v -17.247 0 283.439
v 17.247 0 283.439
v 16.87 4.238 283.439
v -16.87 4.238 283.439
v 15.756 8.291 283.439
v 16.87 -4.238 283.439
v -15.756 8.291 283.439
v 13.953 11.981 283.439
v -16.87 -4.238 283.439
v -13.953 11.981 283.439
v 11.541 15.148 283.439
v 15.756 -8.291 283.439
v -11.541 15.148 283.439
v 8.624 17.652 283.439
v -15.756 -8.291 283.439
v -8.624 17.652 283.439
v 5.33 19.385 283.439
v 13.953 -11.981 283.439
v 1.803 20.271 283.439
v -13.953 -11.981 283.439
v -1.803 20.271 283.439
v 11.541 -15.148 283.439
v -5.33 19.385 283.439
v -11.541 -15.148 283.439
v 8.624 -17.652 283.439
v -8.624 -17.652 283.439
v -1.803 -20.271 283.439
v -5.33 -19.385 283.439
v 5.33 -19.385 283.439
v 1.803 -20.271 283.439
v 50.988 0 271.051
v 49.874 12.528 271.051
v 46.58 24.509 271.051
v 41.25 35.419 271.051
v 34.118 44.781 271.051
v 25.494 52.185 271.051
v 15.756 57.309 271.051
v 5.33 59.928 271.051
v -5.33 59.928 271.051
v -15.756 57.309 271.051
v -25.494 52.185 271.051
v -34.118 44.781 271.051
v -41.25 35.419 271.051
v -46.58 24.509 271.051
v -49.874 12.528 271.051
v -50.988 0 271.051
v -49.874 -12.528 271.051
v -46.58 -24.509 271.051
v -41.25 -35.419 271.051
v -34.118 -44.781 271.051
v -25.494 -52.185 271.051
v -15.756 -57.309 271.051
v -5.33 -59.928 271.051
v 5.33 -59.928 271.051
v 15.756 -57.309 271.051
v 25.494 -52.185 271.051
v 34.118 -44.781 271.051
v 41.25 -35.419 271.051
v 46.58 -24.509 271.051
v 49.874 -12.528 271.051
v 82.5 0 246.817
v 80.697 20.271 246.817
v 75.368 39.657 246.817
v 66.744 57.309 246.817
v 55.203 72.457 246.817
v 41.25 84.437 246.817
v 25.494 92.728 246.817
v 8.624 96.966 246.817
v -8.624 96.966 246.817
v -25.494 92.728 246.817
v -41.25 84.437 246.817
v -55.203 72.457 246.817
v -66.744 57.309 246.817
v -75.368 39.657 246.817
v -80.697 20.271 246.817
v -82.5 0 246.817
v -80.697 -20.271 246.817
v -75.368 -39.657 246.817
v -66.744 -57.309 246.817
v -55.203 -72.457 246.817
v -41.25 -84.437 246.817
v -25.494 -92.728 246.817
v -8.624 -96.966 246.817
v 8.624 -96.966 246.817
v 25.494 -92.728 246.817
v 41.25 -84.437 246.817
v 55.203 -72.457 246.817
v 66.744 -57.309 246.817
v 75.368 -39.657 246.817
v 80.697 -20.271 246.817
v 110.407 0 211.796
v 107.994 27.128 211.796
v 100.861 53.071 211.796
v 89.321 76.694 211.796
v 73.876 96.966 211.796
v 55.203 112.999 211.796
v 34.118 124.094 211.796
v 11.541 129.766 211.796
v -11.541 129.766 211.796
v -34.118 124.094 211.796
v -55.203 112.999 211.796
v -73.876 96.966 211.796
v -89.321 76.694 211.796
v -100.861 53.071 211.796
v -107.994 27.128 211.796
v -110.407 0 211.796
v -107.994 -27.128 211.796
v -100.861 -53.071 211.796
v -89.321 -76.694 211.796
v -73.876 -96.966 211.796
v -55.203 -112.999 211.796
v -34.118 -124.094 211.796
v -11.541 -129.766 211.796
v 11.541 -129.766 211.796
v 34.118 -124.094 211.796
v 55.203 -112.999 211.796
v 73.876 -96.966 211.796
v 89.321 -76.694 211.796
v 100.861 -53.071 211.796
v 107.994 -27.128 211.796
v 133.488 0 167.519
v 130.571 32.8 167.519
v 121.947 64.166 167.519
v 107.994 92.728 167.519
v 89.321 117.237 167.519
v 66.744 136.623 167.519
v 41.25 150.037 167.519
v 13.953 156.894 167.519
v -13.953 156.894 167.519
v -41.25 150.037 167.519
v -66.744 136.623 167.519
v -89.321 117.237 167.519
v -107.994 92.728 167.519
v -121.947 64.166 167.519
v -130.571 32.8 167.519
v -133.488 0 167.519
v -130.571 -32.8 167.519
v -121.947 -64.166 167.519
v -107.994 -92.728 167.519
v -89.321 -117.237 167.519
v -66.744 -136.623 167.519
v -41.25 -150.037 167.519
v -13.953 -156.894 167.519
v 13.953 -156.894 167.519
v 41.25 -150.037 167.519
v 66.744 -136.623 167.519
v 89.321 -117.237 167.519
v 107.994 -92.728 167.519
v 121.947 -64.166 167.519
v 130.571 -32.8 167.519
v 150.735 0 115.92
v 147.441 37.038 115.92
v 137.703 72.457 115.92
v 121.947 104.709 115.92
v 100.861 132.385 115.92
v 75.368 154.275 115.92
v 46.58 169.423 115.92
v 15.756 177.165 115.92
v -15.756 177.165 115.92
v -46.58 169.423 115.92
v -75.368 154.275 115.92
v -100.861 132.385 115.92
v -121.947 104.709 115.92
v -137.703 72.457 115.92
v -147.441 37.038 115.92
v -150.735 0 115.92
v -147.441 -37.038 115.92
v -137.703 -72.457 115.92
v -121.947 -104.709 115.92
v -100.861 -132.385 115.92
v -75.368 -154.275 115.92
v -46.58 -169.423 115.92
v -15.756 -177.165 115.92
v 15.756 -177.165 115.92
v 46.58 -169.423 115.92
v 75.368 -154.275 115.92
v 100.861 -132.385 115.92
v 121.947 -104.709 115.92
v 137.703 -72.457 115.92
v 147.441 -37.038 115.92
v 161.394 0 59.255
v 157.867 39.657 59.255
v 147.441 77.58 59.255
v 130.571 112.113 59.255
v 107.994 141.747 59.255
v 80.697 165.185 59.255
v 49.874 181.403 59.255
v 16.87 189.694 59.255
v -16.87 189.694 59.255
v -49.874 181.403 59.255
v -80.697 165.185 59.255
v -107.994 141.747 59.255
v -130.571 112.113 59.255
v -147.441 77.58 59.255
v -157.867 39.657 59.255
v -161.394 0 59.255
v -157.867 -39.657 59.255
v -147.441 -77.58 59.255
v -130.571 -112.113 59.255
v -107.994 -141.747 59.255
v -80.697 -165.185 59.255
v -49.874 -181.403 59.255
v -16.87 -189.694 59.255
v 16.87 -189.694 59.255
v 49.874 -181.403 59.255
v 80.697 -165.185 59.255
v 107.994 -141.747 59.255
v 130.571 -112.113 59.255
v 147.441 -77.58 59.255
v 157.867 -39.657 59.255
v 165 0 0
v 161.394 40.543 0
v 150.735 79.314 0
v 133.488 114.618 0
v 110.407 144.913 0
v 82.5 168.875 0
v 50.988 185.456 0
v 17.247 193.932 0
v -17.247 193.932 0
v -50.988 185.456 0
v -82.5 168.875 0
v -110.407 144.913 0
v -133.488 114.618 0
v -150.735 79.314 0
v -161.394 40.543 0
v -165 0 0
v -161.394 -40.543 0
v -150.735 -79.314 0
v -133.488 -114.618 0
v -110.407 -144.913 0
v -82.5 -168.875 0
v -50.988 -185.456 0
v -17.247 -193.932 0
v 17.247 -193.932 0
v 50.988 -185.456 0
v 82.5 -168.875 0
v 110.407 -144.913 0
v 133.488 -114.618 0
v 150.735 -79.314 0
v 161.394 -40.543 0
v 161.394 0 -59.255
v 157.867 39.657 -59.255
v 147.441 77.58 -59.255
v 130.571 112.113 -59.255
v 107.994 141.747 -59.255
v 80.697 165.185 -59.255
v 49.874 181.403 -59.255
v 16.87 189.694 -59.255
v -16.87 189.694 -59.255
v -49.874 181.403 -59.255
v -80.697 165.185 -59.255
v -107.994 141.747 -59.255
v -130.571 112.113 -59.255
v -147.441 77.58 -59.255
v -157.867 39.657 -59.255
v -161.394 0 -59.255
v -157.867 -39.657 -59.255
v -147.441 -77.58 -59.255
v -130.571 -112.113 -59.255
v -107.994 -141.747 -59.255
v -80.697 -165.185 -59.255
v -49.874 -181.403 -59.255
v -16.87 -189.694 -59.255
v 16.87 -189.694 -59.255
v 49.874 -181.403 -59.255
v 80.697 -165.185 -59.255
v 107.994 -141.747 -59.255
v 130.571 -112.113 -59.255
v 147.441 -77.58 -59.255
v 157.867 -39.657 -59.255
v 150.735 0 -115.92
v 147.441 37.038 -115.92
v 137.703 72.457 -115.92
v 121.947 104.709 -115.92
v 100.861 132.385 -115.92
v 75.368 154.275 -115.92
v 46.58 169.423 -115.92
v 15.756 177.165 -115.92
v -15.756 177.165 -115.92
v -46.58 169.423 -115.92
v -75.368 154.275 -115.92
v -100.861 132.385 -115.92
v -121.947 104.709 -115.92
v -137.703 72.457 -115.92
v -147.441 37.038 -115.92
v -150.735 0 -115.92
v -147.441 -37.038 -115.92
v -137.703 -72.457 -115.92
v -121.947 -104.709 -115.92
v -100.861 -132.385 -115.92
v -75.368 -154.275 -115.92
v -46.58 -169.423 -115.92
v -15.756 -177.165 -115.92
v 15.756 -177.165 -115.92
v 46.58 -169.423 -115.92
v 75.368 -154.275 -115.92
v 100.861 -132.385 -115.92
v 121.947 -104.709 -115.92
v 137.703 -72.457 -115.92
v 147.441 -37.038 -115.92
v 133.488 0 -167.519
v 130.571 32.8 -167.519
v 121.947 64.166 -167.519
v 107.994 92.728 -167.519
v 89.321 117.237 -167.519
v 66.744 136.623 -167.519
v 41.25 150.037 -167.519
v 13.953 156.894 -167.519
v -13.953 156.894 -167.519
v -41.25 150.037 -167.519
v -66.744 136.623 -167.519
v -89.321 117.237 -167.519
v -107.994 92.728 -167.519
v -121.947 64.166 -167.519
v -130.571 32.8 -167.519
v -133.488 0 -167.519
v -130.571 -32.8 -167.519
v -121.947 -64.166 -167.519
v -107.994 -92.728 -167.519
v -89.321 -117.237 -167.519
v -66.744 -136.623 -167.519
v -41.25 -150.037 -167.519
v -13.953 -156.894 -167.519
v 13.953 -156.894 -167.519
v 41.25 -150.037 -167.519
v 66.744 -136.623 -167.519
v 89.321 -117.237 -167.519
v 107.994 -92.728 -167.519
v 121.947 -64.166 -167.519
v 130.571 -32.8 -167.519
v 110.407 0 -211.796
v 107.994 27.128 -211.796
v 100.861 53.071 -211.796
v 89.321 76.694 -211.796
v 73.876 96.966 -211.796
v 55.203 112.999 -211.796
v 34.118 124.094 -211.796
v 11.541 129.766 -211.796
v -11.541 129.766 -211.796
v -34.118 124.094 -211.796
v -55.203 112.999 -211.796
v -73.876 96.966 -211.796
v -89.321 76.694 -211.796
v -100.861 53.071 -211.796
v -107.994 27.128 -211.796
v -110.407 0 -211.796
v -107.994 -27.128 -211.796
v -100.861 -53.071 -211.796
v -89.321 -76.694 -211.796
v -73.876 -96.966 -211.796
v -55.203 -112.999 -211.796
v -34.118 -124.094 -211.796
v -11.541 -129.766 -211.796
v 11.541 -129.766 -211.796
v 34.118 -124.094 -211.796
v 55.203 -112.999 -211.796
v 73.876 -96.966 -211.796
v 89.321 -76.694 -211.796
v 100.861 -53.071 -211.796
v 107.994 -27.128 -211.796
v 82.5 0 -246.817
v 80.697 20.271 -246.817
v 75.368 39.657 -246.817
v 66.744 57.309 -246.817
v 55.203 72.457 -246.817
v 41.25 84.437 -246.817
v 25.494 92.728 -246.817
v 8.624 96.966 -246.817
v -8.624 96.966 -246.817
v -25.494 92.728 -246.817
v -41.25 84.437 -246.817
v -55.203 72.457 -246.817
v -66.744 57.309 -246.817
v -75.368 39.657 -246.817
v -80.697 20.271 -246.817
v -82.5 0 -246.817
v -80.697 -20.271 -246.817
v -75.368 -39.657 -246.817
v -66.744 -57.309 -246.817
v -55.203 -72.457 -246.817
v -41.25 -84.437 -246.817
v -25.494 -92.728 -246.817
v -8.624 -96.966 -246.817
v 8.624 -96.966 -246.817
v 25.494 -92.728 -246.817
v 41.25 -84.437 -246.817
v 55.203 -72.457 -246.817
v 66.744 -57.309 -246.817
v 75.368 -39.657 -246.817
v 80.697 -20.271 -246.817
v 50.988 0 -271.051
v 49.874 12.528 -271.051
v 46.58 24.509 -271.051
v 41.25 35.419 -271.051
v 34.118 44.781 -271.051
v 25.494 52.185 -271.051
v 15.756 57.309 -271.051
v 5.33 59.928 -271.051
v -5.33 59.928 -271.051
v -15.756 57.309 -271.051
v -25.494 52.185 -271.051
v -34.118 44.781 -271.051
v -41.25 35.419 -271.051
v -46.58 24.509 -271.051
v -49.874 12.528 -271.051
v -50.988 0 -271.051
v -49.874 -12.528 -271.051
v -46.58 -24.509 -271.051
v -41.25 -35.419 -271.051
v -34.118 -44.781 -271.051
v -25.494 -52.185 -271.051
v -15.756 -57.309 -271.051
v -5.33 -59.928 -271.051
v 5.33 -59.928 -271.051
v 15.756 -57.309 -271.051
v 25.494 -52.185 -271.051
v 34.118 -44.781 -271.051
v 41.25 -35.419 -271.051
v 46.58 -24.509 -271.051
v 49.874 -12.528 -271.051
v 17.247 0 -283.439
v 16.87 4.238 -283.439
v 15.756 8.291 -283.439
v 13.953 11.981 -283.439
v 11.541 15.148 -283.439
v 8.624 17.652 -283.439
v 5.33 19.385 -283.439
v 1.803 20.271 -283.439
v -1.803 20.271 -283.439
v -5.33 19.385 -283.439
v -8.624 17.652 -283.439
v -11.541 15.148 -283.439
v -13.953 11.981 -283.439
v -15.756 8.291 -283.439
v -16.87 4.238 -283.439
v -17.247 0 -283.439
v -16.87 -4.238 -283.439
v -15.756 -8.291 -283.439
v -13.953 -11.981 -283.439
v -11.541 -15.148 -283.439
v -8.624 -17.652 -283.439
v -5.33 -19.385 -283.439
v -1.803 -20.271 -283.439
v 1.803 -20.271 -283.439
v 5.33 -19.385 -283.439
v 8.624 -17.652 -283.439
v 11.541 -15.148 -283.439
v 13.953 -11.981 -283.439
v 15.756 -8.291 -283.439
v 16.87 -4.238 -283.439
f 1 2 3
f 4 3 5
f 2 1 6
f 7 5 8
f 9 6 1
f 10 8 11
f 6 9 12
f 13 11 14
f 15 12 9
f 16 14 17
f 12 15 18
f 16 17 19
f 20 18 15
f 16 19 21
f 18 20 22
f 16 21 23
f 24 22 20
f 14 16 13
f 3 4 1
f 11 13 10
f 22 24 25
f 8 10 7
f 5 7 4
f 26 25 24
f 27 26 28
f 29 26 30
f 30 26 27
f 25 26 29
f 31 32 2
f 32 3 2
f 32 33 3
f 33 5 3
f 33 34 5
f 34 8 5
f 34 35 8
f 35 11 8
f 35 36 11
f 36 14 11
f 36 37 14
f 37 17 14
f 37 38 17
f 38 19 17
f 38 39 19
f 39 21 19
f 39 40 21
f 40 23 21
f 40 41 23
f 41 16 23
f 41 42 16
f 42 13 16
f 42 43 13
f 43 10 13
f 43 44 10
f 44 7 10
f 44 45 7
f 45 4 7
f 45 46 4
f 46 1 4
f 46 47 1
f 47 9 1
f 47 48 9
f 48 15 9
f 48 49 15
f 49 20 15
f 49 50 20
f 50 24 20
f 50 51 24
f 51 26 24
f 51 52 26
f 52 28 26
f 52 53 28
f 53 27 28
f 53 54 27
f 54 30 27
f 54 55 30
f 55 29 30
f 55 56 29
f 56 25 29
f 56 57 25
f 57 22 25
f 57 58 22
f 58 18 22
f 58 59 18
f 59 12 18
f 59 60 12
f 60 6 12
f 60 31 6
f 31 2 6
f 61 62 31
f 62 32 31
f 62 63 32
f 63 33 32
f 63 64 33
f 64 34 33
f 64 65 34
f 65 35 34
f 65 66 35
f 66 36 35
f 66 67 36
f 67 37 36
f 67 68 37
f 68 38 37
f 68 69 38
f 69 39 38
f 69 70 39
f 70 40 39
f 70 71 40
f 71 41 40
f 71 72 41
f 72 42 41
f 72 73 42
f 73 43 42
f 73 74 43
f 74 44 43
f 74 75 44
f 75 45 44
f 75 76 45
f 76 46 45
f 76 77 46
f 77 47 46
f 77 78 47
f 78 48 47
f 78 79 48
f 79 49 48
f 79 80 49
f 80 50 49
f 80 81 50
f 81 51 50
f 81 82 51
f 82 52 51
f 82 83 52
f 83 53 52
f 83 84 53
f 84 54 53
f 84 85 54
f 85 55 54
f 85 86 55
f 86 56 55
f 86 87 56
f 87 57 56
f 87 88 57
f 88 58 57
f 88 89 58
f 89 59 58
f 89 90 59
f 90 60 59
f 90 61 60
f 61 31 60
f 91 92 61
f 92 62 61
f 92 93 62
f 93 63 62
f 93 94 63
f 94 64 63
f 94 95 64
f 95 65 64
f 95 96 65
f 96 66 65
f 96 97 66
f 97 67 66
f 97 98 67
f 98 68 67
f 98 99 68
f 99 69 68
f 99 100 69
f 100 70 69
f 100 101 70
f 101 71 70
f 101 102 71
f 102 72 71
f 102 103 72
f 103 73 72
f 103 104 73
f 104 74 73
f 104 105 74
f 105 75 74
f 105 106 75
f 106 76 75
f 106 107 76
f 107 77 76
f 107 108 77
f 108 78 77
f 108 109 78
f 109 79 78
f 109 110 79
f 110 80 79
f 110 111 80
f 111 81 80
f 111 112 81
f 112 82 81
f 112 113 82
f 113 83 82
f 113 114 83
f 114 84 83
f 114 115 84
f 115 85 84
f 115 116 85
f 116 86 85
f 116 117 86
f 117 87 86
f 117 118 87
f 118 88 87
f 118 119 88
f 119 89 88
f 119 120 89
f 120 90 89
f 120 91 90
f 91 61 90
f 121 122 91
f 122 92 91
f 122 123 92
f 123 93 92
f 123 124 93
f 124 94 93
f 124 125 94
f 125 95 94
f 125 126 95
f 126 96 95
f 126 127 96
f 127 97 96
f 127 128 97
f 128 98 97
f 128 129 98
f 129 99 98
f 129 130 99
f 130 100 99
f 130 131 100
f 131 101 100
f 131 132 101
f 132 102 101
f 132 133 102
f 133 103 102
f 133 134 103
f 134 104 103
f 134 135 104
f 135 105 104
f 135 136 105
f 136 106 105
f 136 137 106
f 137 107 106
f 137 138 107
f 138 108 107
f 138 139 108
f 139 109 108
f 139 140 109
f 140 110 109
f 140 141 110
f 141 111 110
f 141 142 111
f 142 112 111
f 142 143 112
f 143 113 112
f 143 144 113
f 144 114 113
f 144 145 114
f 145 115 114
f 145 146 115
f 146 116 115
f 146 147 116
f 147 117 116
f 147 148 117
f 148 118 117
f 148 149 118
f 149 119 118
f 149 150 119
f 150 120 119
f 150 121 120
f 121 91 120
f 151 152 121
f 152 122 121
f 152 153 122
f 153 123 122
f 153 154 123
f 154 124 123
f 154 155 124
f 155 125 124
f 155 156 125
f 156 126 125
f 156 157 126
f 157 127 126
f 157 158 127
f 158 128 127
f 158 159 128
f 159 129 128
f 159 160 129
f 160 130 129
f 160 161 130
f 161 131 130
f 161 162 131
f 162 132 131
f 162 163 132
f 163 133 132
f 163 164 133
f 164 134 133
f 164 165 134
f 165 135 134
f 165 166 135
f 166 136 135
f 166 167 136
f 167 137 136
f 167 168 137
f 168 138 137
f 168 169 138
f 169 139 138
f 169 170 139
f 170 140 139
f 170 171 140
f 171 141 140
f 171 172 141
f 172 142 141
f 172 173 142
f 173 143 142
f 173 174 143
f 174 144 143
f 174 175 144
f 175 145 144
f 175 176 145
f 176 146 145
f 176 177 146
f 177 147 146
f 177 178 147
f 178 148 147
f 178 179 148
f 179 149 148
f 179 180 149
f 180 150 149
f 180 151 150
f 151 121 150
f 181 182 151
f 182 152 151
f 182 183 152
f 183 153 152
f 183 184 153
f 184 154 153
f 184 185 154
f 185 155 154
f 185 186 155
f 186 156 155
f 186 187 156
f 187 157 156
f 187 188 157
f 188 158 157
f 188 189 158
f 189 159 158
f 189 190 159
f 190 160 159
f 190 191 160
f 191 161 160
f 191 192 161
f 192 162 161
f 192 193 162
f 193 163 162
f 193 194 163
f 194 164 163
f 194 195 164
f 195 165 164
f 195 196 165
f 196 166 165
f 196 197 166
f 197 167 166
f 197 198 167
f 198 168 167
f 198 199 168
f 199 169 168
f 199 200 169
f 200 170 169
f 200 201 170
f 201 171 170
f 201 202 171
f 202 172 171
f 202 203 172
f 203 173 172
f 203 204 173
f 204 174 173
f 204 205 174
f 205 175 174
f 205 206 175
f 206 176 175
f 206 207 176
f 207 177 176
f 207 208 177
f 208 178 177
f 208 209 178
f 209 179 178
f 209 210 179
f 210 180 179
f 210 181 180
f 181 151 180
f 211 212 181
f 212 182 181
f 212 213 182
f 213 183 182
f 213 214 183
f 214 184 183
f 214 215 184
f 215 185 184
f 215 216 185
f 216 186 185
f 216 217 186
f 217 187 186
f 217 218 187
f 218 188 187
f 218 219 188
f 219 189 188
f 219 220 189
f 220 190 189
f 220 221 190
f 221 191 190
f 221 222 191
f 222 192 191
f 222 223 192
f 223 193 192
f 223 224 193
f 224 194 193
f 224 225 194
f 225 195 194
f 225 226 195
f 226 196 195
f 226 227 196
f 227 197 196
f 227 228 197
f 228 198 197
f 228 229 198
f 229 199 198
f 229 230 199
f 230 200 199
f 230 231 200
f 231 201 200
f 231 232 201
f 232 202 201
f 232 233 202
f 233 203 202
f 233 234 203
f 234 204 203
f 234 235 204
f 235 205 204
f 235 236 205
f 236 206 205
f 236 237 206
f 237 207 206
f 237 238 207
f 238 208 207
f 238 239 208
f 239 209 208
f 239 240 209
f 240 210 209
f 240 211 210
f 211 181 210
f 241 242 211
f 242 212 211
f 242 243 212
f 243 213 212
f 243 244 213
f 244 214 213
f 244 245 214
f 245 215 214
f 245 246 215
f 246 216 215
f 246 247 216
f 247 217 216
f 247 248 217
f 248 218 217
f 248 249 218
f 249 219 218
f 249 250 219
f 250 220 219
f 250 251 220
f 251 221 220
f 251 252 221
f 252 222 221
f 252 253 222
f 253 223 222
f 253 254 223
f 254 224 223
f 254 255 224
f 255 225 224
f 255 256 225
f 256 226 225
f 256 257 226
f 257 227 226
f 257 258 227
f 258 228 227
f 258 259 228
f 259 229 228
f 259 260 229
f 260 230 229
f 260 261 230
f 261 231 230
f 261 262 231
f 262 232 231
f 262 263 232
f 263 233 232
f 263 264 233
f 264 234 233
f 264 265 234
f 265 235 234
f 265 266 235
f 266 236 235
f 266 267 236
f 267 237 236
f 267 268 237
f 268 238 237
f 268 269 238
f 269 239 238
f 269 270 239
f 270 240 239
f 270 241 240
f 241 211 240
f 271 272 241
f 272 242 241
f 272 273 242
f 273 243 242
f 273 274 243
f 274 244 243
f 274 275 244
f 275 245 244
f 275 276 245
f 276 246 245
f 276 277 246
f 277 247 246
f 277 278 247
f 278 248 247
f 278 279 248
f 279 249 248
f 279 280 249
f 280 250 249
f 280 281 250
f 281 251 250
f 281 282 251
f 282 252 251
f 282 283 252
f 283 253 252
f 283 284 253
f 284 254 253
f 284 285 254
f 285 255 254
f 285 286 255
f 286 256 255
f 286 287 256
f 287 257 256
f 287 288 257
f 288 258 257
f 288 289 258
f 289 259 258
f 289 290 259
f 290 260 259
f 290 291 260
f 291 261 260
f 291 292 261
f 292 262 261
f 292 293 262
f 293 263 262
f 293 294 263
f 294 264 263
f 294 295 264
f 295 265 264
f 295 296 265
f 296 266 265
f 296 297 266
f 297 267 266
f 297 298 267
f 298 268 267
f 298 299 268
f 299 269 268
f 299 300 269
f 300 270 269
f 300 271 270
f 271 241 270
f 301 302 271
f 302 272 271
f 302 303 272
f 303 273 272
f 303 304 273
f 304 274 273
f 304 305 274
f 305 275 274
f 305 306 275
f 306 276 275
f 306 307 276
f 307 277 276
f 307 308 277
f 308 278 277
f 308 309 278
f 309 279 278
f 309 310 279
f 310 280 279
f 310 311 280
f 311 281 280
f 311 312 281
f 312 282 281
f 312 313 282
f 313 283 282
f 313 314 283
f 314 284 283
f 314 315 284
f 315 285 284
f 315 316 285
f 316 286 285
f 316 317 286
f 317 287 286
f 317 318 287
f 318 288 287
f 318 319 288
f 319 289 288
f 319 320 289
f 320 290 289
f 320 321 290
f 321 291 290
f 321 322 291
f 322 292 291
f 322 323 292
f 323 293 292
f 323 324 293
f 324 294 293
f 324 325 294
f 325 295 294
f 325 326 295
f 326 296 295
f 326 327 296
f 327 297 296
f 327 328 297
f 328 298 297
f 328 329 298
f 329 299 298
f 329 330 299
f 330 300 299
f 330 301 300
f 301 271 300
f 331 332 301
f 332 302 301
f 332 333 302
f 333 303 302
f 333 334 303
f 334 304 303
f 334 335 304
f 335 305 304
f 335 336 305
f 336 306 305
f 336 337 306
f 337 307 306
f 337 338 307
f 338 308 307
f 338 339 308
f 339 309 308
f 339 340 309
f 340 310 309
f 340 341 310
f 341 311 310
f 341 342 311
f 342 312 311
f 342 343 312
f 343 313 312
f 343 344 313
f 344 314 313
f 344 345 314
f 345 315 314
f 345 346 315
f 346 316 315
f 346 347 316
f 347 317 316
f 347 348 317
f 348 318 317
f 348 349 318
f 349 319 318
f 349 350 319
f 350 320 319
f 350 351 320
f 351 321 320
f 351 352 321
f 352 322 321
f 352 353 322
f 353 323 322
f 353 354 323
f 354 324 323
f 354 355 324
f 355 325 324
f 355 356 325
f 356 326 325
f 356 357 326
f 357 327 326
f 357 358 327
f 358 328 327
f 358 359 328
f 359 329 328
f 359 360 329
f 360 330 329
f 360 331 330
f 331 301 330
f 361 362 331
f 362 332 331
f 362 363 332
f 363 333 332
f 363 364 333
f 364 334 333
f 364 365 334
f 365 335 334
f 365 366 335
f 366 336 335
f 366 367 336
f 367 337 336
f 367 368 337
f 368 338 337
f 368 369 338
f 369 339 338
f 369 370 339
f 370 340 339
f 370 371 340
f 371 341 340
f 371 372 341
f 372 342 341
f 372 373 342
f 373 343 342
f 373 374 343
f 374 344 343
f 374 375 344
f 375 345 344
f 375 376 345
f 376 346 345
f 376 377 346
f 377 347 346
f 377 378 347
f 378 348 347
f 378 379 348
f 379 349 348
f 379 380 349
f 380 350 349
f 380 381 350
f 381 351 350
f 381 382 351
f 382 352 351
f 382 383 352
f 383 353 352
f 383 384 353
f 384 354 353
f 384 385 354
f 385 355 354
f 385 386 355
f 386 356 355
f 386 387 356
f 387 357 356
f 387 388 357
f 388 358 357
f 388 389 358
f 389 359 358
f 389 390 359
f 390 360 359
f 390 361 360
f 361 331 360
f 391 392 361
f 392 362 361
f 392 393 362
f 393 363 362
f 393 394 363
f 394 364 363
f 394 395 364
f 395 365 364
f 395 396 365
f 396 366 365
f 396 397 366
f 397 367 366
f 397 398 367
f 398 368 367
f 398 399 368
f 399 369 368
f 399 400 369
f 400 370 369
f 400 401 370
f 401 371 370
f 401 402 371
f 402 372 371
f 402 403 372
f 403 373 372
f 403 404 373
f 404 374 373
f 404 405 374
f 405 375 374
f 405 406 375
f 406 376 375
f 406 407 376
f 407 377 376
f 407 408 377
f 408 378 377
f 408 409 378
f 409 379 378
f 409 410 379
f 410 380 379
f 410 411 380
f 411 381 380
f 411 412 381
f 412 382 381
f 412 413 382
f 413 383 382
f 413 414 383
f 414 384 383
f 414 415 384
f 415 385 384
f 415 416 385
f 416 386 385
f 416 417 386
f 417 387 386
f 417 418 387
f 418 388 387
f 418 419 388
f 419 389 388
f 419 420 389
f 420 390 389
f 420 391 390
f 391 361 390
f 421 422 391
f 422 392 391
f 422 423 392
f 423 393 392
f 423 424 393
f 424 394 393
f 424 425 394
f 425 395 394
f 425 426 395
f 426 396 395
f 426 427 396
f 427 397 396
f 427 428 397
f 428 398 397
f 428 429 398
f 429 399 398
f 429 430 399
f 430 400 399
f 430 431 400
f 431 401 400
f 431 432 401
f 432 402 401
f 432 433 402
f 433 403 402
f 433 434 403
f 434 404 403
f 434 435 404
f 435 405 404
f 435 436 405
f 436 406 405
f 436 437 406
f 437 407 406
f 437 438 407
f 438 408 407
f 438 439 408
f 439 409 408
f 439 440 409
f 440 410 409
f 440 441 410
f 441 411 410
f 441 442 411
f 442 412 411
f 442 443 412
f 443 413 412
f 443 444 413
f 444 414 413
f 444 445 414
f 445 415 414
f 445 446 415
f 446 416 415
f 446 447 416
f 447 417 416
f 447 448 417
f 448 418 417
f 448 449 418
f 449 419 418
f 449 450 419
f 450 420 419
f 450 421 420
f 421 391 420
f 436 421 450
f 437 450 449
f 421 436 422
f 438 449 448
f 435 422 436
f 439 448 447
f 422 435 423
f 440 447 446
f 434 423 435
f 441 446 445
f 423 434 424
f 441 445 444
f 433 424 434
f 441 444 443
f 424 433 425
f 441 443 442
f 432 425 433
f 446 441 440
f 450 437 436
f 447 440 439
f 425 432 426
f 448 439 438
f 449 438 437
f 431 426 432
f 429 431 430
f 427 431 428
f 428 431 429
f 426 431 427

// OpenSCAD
// Generated by SolidPython 1.0.1 on 2020-07-29 00:46:50


scale(v = [11, 13, 19]) {
	sphere(r = 15);
}
/***********************************************
*********      SolidPython code:      **********
************************************************
 
# import packages: SolidPython
from solid import *
from solid.utils import *
from itertools import chain, combinations, permutations


class Resize:

    def __init__(self, scad_file):
        self.scad_file = scad_file
        #self.scad_file = import_scad(scad_file)
        # cone/cylinder param:
        self.r1 = 0
        self.r2 = 0
        self.h = 0
        # rectangular prism param:
        self.w = 0
        self.l = 0
        # ellipse param:
        self.r = 0

    # import OpenScad code (file name corresponds to shape)


    # classify shape + parameters
    def assign(self, param1, param2, param3):
        if self.scad_file == 'cone.scad':
            self.r1 = param1
            self.r2 = param2
            self.h = param3
        elif self.scad_file == 'cylinder.scad':
            self.r1 = param1
            self.r2 = param2
            self.h = param3
        elif self.scad_file == 'rectangularPrism.scad':
            self.h = param1
            self.l = param2
            self.w = param3
        else:
            self.r = param1
            self.h = param2

    # resize parameters
    def iterate(self):
        x = range(3, 20, 2)
        i = 1
        if self.scad_file == 'cone.scad':
            tempList = list(permutations(x, 2))
            for temp in tempList:
                param1 = temp[0]
                param2 = temp[1]
                filepath = 'produced_scad_files/' + 'cone' + str(param1) + '_' + str(param2) + '_' + '.scad'
                scad_render_to_file(cylinder(h=param1, r1=param2, r2=0), filepath)

        elif self.scad_file == 'cylinder.scad':
            tempList = list(permutations(x, 3))
            for temp in tempList:
                param1 = temp[0]
                param2 = temp[1]
                filepath = 'produced_scad_files/' + 'cylinder' + str(param1) + '_' + str(param2) + '_' + '.scad'
                scad_render_to_file(cylinder(h=param1, r1=param2, r2=param2), filepath)

        elif self.scad_file == 'rectangularPrism.scad':
            tempList = list(permutations(x, 3))
            for temp in tempList:
                param1 = temp[0]
                param2 = temp[1]
                param3 = temp[2]
                filepath = 'produced_scad_files/' + 'rectangularPrism' + str(param1) + '_' + str(param2) + '_' + str(
                    param3) + '.scad'
                scad_render_to_file(cube(size=(param1, param2, param3)), filepath)

        elif self.scad_file == 'ellipse.scad':
            tempList = list(permutations(x, 4))
            for temp in tempList:
                param1 = temp[0]
                param2 = temp[1]
                param3 = temp[2]
                param4 = temp[3]
                filepath = 'produced_scad_files/' + 'ellipse' + str(param1) + '_' + str(param2) + '_' + str(param3) + '_' + str(param4) + '.scad'
                scad_render_to_file(scale([param1, param2, param3])(sphere(r=param4)), filepath)

    def render_to_scadfile(self):
        scad_render_to_file(scad, 'example.scad') 
 
************************************************/
